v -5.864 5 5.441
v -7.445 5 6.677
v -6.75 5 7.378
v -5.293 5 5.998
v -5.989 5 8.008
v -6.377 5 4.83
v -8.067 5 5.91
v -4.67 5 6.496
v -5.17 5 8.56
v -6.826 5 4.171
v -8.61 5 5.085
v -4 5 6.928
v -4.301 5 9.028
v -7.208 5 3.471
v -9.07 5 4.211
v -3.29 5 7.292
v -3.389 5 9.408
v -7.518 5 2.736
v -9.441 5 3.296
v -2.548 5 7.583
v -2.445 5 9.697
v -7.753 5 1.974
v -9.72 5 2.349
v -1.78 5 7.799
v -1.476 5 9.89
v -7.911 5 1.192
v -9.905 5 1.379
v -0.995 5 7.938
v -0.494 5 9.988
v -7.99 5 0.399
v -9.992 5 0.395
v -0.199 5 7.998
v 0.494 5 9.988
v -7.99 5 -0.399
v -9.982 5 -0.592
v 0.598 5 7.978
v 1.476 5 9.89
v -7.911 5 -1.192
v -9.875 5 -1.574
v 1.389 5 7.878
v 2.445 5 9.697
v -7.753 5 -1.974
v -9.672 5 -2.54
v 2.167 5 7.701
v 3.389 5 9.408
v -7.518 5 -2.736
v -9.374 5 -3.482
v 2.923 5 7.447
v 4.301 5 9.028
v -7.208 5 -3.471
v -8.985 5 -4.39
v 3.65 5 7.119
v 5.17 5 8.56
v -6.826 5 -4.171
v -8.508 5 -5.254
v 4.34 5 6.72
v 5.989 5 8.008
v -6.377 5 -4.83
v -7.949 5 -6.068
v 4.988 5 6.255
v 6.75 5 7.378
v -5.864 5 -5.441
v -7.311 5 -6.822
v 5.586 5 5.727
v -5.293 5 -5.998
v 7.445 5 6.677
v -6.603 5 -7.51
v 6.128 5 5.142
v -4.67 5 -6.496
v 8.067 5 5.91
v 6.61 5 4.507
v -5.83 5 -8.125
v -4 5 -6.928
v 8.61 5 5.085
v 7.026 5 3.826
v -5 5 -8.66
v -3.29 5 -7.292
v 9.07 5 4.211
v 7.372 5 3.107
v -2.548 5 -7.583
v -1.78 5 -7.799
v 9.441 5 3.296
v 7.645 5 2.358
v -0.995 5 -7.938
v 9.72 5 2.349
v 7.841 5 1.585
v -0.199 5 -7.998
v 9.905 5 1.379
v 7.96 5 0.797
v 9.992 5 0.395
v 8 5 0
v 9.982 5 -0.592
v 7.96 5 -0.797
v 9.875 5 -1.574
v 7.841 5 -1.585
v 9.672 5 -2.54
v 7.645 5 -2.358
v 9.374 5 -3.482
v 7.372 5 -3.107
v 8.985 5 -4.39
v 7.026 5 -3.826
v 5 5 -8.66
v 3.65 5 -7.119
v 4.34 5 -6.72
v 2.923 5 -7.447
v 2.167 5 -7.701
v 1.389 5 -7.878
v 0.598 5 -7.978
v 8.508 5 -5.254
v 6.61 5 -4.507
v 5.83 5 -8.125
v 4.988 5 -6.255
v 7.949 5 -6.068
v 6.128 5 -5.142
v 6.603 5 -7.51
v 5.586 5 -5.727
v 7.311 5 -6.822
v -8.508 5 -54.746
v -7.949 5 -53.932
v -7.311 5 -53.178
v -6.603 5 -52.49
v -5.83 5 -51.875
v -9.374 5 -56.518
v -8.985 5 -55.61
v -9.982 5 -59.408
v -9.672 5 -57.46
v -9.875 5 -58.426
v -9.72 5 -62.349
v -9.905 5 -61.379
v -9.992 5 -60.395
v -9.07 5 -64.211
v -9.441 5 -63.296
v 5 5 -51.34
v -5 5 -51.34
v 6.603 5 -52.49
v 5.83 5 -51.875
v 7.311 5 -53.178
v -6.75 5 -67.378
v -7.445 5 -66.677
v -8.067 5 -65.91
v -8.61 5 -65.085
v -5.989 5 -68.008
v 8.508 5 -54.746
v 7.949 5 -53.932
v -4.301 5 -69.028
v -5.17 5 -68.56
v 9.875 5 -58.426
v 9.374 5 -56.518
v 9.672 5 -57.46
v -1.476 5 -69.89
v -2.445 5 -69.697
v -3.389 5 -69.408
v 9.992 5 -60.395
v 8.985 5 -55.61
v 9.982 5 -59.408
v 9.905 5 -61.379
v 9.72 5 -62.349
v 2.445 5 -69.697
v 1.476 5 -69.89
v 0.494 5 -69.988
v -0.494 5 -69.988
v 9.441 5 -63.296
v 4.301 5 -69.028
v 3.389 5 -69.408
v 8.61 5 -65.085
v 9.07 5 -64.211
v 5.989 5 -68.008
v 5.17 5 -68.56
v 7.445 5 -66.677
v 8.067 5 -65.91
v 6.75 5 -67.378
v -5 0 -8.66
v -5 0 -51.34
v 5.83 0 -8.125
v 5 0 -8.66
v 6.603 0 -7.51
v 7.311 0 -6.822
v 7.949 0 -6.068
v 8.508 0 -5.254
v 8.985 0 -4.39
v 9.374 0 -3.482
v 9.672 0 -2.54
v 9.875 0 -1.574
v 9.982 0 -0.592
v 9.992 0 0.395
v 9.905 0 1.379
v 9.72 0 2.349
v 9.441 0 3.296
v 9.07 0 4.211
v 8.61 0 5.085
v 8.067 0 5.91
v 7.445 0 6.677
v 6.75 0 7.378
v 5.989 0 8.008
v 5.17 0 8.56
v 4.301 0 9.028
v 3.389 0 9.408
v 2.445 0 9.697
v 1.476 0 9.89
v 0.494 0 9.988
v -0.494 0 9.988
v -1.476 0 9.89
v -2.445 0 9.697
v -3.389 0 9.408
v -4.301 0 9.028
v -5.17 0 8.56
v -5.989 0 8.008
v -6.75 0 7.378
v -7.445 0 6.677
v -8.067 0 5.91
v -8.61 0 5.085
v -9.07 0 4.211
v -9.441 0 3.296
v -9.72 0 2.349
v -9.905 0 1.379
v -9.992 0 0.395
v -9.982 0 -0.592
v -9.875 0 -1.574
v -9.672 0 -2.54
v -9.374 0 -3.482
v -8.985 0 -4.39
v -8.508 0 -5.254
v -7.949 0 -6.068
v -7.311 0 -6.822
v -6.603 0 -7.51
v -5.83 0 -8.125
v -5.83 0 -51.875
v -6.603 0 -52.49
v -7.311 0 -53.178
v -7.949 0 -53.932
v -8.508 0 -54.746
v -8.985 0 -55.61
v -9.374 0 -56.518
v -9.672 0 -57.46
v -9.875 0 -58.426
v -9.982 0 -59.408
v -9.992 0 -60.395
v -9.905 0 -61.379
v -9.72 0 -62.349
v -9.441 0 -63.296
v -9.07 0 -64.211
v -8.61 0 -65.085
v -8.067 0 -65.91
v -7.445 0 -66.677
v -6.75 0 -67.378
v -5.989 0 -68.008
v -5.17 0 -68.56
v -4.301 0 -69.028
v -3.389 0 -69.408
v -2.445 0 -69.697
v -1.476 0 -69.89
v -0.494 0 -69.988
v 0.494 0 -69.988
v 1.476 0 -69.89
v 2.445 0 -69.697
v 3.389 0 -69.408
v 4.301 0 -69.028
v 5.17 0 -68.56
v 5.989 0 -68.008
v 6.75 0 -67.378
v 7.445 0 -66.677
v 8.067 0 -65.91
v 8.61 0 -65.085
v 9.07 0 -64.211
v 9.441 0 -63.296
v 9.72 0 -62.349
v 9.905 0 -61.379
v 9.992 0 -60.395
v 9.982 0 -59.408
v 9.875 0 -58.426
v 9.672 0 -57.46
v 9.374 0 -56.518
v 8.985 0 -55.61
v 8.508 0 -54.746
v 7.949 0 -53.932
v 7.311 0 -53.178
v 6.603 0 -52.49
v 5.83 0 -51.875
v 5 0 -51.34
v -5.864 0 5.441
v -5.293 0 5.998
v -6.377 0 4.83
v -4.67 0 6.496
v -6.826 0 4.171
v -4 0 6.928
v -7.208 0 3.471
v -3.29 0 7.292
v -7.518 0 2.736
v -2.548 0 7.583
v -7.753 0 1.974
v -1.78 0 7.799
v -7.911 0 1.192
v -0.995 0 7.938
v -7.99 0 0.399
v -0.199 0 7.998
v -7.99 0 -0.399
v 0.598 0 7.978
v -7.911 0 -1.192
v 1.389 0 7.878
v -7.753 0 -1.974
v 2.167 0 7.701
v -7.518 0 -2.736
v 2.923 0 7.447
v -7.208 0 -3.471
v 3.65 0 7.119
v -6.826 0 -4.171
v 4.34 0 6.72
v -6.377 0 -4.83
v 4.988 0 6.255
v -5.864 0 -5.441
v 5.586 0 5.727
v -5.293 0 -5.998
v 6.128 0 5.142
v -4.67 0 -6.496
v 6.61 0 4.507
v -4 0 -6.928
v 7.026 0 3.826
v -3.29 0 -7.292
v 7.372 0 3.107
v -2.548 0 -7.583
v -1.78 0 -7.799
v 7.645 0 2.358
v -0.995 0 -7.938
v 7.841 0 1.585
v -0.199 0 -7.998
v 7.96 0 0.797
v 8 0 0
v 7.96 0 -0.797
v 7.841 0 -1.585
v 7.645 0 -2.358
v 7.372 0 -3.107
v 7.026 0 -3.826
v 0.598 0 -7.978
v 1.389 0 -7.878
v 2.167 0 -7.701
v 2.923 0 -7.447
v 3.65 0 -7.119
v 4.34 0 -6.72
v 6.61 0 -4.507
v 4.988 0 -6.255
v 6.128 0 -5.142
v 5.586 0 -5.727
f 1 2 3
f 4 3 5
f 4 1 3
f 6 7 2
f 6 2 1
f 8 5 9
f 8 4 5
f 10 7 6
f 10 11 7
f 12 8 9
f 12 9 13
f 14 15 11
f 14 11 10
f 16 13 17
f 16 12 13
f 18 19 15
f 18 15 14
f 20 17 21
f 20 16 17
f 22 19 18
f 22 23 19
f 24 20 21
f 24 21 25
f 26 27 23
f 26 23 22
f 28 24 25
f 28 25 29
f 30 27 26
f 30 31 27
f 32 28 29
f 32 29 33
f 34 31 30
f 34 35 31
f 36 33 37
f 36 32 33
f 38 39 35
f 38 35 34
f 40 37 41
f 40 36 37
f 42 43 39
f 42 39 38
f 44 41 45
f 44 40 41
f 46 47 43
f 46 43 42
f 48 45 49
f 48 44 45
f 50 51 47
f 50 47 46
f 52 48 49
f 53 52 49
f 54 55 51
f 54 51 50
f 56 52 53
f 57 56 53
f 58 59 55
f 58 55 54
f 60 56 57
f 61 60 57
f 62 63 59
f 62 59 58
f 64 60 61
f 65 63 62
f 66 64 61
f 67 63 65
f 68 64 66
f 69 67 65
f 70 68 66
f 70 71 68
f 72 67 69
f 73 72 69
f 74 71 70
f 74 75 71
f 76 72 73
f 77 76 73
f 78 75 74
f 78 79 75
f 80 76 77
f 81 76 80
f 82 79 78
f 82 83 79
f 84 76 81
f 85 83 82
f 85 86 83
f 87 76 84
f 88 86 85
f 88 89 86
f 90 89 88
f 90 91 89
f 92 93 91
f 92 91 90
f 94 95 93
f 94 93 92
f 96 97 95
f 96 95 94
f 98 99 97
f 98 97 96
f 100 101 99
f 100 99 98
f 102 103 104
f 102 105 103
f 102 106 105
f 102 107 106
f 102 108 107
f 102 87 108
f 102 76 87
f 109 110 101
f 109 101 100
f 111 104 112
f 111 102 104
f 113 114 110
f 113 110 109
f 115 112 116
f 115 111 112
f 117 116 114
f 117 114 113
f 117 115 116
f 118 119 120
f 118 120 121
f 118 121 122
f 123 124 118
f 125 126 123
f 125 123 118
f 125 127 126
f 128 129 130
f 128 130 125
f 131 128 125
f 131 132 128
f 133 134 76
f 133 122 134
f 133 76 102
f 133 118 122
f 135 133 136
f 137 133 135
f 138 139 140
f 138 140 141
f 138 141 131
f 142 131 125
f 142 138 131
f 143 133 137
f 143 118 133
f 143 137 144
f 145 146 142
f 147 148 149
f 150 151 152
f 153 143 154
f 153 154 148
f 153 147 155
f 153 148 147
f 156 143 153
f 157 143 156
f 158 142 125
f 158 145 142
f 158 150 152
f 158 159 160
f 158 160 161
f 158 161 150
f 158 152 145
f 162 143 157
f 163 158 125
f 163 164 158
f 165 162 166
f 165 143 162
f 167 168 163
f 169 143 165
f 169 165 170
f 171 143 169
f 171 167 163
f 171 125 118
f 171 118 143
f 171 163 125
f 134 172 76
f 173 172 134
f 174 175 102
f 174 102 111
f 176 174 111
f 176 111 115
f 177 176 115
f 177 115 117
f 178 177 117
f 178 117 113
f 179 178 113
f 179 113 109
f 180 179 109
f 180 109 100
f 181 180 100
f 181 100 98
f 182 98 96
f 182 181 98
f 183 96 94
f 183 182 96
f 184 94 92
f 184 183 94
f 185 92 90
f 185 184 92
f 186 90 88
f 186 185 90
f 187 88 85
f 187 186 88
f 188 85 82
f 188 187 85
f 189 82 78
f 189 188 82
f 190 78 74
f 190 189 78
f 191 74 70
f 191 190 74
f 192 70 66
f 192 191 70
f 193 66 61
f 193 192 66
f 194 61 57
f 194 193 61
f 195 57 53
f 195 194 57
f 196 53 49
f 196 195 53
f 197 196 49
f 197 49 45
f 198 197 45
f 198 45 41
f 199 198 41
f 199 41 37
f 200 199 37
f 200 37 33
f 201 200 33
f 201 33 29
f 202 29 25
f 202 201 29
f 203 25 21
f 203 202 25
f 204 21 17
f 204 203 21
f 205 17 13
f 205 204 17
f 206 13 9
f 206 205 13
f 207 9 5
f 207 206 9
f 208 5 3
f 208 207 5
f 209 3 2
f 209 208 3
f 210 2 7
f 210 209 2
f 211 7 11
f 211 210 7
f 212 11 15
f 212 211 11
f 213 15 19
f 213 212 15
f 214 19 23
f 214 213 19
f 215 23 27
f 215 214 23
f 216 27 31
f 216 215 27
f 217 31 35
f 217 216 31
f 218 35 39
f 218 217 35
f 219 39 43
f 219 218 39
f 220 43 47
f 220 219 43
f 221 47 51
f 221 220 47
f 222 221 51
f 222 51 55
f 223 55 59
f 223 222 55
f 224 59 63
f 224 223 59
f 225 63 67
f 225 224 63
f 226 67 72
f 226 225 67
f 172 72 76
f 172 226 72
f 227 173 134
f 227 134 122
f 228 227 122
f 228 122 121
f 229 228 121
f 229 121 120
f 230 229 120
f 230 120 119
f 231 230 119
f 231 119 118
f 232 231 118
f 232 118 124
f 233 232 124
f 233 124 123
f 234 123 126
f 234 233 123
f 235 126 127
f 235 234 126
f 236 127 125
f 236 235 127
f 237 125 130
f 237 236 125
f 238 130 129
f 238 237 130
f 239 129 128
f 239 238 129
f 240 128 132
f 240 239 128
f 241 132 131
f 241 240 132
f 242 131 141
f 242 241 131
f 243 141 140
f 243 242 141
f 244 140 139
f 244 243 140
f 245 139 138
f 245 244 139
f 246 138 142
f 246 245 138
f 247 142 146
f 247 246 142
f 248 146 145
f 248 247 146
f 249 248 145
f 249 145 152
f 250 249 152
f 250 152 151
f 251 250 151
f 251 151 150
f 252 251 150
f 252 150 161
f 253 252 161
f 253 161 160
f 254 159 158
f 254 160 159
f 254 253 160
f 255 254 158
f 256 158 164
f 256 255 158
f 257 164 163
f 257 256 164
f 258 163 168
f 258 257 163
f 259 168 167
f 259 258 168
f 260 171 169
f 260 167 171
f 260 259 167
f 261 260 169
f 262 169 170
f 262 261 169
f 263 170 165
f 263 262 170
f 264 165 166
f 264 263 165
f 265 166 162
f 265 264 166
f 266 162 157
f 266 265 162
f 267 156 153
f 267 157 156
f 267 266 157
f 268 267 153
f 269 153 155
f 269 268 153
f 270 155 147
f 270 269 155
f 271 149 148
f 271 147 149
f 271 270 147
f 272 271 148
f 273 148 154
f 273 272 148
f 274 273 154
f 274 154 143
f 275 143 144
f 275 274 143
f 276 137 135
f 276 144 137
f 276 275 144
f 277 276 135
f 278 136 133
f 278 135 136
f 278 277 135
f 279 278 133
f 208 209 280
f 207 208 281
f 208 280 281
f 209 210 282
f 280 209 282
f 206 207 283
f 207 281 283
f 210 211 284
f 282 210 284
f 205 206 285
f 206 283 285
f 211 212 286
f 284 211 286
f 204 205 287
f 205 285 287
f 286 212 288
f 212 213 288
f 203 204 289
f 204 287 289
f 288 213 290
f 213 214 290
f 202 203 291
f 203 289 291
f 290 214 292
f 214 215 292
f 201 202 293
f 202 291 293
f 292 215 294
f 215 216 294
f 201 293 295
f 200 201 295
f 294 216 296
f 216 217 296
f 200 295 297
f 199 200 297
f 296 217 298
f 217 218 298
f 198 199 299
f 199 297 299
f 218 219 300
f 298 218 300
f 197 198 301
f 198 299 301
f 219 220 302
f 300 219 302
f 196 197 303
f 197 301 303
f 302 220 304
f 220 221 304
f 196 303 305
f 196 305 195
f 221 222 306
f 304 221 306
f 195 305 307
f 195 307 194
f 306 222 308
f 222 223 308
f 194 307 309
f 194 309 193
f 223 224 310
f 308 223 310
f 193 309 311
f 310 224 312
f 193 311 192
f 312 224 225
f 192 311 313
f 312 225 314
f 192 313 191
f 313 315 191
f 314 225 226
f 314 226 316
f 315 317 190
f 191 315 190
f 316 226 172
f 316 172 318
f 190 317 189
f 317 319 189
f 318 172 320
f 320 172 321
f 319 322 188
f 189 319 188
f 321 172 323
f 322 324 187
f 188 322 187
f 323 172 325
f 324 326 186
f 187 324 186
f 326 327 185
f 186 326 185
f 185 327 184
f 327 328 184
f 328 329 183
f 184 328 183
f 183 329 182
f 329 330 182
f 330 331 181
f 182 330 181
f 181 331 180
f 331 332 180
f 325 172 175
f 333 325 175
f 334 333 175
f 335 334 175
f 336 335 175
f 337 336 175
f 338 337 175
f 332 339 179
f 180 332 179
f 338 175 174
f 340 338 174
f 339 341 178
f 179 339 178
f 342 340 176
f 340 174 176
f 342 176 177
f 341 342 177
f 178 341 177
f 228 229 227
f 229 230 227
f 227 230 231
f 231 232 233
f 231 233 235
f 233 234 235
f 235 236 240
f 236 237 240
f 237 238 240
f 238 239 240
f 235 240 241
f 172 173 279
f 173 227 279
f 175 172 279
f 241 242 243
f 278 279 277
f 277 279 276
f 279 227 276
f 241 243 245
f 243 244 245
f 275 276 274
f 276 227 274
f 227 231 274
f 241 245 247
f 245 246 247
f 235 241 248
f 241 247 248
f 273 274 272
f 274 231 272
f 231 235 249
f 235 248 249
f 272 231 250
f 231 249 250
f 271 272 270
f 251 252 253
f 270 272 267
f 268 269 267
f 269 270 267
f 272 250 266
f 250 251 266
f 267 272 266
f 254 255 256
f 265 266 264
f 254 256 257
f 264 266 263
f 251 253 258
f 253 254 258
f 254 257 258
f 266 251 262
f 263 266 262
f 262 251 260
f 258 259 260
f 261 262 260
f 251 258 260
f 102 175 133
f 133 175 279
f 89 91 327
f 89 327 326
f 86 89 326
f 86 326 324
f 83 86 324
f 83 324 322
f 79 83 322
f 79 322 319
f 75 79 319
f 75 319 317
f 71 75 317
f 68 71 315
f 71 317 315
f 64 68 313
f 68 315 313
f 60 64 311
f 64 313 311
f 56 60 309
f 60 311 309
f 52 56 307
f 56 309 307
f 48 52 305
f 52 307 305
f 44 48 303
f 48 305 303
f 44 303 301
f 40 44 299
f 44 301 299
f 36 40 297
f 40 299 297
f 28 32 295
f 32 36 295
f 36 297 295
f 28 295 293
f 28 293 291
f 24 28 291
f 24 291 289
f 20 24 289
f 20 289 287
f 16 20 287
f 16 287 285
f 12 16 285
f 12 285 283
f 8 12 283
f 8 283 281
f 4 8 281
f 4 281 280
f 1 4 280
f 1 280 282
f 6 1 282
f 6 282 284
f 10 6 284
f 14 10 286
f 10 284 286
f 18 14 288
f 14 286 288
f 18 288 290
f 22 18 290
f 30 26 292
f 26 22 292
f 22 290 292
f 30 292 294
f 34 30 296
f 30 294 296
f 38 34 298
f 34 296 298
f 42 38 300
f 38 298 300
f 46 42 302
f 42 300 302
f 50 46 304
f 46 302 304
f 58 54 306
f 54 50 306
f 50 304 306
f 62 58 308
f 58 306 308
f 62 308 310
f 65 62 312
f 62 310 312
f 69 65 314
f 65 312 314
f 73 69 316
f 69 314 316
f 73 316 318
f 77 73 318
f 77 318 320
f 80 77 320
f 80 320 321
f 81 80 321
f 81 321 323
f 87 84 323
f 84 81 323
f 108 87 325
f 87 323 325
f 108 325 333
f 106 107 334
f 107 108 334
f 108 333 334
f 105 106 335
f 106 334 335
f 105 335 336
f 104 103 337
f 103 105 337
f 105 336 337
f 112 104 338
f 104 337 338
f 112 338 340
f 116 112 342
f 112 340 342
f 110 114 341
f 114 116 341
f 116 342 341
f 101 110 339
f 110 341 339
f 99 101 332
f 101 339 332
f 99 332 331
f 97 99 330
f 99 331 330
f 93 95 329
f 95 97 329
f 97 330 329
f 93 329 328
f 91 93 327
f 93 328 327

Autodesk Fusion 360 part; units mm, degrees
sketch "Boceto1" plane through (0, 0, 0) normal (0, 1, 0) x (1, 0, 0)
  circle A0 centre (0, 0) radius 8
  circle A1 centre (0, 0) radius 10
  line L0 (0, 0) -> (0, 70)
  line L1 (0, 70) -> (0, 60)
  circle A2 centre (0, 60) radius 10
  line L2 (0, 0) -> (-5, 0)
  line L3 (-5, 0) -> (-5, 51.3397)
  line L4 (0, 0) -> (5, 0)
  line L5 (5, 0) -> (5, 51.3397)
  dimension "d1" = 16
  dimension "d2" = 70
extrude "Extruir1" add sketch "Boceto1" along normal blind 5 contours A0 A1 L3 L5 | A0 A1 L0 L5 | A0 A1 L0 L3 | A1 L0 A2 L5 | A1 L0 A2 L3 | L0 L1 A2 | L0 L1 A2
ref_plane "PlanoDeObra1" through (0, 2.5396, -70) normal (0, 0, -1) x (1, 0, 0)
